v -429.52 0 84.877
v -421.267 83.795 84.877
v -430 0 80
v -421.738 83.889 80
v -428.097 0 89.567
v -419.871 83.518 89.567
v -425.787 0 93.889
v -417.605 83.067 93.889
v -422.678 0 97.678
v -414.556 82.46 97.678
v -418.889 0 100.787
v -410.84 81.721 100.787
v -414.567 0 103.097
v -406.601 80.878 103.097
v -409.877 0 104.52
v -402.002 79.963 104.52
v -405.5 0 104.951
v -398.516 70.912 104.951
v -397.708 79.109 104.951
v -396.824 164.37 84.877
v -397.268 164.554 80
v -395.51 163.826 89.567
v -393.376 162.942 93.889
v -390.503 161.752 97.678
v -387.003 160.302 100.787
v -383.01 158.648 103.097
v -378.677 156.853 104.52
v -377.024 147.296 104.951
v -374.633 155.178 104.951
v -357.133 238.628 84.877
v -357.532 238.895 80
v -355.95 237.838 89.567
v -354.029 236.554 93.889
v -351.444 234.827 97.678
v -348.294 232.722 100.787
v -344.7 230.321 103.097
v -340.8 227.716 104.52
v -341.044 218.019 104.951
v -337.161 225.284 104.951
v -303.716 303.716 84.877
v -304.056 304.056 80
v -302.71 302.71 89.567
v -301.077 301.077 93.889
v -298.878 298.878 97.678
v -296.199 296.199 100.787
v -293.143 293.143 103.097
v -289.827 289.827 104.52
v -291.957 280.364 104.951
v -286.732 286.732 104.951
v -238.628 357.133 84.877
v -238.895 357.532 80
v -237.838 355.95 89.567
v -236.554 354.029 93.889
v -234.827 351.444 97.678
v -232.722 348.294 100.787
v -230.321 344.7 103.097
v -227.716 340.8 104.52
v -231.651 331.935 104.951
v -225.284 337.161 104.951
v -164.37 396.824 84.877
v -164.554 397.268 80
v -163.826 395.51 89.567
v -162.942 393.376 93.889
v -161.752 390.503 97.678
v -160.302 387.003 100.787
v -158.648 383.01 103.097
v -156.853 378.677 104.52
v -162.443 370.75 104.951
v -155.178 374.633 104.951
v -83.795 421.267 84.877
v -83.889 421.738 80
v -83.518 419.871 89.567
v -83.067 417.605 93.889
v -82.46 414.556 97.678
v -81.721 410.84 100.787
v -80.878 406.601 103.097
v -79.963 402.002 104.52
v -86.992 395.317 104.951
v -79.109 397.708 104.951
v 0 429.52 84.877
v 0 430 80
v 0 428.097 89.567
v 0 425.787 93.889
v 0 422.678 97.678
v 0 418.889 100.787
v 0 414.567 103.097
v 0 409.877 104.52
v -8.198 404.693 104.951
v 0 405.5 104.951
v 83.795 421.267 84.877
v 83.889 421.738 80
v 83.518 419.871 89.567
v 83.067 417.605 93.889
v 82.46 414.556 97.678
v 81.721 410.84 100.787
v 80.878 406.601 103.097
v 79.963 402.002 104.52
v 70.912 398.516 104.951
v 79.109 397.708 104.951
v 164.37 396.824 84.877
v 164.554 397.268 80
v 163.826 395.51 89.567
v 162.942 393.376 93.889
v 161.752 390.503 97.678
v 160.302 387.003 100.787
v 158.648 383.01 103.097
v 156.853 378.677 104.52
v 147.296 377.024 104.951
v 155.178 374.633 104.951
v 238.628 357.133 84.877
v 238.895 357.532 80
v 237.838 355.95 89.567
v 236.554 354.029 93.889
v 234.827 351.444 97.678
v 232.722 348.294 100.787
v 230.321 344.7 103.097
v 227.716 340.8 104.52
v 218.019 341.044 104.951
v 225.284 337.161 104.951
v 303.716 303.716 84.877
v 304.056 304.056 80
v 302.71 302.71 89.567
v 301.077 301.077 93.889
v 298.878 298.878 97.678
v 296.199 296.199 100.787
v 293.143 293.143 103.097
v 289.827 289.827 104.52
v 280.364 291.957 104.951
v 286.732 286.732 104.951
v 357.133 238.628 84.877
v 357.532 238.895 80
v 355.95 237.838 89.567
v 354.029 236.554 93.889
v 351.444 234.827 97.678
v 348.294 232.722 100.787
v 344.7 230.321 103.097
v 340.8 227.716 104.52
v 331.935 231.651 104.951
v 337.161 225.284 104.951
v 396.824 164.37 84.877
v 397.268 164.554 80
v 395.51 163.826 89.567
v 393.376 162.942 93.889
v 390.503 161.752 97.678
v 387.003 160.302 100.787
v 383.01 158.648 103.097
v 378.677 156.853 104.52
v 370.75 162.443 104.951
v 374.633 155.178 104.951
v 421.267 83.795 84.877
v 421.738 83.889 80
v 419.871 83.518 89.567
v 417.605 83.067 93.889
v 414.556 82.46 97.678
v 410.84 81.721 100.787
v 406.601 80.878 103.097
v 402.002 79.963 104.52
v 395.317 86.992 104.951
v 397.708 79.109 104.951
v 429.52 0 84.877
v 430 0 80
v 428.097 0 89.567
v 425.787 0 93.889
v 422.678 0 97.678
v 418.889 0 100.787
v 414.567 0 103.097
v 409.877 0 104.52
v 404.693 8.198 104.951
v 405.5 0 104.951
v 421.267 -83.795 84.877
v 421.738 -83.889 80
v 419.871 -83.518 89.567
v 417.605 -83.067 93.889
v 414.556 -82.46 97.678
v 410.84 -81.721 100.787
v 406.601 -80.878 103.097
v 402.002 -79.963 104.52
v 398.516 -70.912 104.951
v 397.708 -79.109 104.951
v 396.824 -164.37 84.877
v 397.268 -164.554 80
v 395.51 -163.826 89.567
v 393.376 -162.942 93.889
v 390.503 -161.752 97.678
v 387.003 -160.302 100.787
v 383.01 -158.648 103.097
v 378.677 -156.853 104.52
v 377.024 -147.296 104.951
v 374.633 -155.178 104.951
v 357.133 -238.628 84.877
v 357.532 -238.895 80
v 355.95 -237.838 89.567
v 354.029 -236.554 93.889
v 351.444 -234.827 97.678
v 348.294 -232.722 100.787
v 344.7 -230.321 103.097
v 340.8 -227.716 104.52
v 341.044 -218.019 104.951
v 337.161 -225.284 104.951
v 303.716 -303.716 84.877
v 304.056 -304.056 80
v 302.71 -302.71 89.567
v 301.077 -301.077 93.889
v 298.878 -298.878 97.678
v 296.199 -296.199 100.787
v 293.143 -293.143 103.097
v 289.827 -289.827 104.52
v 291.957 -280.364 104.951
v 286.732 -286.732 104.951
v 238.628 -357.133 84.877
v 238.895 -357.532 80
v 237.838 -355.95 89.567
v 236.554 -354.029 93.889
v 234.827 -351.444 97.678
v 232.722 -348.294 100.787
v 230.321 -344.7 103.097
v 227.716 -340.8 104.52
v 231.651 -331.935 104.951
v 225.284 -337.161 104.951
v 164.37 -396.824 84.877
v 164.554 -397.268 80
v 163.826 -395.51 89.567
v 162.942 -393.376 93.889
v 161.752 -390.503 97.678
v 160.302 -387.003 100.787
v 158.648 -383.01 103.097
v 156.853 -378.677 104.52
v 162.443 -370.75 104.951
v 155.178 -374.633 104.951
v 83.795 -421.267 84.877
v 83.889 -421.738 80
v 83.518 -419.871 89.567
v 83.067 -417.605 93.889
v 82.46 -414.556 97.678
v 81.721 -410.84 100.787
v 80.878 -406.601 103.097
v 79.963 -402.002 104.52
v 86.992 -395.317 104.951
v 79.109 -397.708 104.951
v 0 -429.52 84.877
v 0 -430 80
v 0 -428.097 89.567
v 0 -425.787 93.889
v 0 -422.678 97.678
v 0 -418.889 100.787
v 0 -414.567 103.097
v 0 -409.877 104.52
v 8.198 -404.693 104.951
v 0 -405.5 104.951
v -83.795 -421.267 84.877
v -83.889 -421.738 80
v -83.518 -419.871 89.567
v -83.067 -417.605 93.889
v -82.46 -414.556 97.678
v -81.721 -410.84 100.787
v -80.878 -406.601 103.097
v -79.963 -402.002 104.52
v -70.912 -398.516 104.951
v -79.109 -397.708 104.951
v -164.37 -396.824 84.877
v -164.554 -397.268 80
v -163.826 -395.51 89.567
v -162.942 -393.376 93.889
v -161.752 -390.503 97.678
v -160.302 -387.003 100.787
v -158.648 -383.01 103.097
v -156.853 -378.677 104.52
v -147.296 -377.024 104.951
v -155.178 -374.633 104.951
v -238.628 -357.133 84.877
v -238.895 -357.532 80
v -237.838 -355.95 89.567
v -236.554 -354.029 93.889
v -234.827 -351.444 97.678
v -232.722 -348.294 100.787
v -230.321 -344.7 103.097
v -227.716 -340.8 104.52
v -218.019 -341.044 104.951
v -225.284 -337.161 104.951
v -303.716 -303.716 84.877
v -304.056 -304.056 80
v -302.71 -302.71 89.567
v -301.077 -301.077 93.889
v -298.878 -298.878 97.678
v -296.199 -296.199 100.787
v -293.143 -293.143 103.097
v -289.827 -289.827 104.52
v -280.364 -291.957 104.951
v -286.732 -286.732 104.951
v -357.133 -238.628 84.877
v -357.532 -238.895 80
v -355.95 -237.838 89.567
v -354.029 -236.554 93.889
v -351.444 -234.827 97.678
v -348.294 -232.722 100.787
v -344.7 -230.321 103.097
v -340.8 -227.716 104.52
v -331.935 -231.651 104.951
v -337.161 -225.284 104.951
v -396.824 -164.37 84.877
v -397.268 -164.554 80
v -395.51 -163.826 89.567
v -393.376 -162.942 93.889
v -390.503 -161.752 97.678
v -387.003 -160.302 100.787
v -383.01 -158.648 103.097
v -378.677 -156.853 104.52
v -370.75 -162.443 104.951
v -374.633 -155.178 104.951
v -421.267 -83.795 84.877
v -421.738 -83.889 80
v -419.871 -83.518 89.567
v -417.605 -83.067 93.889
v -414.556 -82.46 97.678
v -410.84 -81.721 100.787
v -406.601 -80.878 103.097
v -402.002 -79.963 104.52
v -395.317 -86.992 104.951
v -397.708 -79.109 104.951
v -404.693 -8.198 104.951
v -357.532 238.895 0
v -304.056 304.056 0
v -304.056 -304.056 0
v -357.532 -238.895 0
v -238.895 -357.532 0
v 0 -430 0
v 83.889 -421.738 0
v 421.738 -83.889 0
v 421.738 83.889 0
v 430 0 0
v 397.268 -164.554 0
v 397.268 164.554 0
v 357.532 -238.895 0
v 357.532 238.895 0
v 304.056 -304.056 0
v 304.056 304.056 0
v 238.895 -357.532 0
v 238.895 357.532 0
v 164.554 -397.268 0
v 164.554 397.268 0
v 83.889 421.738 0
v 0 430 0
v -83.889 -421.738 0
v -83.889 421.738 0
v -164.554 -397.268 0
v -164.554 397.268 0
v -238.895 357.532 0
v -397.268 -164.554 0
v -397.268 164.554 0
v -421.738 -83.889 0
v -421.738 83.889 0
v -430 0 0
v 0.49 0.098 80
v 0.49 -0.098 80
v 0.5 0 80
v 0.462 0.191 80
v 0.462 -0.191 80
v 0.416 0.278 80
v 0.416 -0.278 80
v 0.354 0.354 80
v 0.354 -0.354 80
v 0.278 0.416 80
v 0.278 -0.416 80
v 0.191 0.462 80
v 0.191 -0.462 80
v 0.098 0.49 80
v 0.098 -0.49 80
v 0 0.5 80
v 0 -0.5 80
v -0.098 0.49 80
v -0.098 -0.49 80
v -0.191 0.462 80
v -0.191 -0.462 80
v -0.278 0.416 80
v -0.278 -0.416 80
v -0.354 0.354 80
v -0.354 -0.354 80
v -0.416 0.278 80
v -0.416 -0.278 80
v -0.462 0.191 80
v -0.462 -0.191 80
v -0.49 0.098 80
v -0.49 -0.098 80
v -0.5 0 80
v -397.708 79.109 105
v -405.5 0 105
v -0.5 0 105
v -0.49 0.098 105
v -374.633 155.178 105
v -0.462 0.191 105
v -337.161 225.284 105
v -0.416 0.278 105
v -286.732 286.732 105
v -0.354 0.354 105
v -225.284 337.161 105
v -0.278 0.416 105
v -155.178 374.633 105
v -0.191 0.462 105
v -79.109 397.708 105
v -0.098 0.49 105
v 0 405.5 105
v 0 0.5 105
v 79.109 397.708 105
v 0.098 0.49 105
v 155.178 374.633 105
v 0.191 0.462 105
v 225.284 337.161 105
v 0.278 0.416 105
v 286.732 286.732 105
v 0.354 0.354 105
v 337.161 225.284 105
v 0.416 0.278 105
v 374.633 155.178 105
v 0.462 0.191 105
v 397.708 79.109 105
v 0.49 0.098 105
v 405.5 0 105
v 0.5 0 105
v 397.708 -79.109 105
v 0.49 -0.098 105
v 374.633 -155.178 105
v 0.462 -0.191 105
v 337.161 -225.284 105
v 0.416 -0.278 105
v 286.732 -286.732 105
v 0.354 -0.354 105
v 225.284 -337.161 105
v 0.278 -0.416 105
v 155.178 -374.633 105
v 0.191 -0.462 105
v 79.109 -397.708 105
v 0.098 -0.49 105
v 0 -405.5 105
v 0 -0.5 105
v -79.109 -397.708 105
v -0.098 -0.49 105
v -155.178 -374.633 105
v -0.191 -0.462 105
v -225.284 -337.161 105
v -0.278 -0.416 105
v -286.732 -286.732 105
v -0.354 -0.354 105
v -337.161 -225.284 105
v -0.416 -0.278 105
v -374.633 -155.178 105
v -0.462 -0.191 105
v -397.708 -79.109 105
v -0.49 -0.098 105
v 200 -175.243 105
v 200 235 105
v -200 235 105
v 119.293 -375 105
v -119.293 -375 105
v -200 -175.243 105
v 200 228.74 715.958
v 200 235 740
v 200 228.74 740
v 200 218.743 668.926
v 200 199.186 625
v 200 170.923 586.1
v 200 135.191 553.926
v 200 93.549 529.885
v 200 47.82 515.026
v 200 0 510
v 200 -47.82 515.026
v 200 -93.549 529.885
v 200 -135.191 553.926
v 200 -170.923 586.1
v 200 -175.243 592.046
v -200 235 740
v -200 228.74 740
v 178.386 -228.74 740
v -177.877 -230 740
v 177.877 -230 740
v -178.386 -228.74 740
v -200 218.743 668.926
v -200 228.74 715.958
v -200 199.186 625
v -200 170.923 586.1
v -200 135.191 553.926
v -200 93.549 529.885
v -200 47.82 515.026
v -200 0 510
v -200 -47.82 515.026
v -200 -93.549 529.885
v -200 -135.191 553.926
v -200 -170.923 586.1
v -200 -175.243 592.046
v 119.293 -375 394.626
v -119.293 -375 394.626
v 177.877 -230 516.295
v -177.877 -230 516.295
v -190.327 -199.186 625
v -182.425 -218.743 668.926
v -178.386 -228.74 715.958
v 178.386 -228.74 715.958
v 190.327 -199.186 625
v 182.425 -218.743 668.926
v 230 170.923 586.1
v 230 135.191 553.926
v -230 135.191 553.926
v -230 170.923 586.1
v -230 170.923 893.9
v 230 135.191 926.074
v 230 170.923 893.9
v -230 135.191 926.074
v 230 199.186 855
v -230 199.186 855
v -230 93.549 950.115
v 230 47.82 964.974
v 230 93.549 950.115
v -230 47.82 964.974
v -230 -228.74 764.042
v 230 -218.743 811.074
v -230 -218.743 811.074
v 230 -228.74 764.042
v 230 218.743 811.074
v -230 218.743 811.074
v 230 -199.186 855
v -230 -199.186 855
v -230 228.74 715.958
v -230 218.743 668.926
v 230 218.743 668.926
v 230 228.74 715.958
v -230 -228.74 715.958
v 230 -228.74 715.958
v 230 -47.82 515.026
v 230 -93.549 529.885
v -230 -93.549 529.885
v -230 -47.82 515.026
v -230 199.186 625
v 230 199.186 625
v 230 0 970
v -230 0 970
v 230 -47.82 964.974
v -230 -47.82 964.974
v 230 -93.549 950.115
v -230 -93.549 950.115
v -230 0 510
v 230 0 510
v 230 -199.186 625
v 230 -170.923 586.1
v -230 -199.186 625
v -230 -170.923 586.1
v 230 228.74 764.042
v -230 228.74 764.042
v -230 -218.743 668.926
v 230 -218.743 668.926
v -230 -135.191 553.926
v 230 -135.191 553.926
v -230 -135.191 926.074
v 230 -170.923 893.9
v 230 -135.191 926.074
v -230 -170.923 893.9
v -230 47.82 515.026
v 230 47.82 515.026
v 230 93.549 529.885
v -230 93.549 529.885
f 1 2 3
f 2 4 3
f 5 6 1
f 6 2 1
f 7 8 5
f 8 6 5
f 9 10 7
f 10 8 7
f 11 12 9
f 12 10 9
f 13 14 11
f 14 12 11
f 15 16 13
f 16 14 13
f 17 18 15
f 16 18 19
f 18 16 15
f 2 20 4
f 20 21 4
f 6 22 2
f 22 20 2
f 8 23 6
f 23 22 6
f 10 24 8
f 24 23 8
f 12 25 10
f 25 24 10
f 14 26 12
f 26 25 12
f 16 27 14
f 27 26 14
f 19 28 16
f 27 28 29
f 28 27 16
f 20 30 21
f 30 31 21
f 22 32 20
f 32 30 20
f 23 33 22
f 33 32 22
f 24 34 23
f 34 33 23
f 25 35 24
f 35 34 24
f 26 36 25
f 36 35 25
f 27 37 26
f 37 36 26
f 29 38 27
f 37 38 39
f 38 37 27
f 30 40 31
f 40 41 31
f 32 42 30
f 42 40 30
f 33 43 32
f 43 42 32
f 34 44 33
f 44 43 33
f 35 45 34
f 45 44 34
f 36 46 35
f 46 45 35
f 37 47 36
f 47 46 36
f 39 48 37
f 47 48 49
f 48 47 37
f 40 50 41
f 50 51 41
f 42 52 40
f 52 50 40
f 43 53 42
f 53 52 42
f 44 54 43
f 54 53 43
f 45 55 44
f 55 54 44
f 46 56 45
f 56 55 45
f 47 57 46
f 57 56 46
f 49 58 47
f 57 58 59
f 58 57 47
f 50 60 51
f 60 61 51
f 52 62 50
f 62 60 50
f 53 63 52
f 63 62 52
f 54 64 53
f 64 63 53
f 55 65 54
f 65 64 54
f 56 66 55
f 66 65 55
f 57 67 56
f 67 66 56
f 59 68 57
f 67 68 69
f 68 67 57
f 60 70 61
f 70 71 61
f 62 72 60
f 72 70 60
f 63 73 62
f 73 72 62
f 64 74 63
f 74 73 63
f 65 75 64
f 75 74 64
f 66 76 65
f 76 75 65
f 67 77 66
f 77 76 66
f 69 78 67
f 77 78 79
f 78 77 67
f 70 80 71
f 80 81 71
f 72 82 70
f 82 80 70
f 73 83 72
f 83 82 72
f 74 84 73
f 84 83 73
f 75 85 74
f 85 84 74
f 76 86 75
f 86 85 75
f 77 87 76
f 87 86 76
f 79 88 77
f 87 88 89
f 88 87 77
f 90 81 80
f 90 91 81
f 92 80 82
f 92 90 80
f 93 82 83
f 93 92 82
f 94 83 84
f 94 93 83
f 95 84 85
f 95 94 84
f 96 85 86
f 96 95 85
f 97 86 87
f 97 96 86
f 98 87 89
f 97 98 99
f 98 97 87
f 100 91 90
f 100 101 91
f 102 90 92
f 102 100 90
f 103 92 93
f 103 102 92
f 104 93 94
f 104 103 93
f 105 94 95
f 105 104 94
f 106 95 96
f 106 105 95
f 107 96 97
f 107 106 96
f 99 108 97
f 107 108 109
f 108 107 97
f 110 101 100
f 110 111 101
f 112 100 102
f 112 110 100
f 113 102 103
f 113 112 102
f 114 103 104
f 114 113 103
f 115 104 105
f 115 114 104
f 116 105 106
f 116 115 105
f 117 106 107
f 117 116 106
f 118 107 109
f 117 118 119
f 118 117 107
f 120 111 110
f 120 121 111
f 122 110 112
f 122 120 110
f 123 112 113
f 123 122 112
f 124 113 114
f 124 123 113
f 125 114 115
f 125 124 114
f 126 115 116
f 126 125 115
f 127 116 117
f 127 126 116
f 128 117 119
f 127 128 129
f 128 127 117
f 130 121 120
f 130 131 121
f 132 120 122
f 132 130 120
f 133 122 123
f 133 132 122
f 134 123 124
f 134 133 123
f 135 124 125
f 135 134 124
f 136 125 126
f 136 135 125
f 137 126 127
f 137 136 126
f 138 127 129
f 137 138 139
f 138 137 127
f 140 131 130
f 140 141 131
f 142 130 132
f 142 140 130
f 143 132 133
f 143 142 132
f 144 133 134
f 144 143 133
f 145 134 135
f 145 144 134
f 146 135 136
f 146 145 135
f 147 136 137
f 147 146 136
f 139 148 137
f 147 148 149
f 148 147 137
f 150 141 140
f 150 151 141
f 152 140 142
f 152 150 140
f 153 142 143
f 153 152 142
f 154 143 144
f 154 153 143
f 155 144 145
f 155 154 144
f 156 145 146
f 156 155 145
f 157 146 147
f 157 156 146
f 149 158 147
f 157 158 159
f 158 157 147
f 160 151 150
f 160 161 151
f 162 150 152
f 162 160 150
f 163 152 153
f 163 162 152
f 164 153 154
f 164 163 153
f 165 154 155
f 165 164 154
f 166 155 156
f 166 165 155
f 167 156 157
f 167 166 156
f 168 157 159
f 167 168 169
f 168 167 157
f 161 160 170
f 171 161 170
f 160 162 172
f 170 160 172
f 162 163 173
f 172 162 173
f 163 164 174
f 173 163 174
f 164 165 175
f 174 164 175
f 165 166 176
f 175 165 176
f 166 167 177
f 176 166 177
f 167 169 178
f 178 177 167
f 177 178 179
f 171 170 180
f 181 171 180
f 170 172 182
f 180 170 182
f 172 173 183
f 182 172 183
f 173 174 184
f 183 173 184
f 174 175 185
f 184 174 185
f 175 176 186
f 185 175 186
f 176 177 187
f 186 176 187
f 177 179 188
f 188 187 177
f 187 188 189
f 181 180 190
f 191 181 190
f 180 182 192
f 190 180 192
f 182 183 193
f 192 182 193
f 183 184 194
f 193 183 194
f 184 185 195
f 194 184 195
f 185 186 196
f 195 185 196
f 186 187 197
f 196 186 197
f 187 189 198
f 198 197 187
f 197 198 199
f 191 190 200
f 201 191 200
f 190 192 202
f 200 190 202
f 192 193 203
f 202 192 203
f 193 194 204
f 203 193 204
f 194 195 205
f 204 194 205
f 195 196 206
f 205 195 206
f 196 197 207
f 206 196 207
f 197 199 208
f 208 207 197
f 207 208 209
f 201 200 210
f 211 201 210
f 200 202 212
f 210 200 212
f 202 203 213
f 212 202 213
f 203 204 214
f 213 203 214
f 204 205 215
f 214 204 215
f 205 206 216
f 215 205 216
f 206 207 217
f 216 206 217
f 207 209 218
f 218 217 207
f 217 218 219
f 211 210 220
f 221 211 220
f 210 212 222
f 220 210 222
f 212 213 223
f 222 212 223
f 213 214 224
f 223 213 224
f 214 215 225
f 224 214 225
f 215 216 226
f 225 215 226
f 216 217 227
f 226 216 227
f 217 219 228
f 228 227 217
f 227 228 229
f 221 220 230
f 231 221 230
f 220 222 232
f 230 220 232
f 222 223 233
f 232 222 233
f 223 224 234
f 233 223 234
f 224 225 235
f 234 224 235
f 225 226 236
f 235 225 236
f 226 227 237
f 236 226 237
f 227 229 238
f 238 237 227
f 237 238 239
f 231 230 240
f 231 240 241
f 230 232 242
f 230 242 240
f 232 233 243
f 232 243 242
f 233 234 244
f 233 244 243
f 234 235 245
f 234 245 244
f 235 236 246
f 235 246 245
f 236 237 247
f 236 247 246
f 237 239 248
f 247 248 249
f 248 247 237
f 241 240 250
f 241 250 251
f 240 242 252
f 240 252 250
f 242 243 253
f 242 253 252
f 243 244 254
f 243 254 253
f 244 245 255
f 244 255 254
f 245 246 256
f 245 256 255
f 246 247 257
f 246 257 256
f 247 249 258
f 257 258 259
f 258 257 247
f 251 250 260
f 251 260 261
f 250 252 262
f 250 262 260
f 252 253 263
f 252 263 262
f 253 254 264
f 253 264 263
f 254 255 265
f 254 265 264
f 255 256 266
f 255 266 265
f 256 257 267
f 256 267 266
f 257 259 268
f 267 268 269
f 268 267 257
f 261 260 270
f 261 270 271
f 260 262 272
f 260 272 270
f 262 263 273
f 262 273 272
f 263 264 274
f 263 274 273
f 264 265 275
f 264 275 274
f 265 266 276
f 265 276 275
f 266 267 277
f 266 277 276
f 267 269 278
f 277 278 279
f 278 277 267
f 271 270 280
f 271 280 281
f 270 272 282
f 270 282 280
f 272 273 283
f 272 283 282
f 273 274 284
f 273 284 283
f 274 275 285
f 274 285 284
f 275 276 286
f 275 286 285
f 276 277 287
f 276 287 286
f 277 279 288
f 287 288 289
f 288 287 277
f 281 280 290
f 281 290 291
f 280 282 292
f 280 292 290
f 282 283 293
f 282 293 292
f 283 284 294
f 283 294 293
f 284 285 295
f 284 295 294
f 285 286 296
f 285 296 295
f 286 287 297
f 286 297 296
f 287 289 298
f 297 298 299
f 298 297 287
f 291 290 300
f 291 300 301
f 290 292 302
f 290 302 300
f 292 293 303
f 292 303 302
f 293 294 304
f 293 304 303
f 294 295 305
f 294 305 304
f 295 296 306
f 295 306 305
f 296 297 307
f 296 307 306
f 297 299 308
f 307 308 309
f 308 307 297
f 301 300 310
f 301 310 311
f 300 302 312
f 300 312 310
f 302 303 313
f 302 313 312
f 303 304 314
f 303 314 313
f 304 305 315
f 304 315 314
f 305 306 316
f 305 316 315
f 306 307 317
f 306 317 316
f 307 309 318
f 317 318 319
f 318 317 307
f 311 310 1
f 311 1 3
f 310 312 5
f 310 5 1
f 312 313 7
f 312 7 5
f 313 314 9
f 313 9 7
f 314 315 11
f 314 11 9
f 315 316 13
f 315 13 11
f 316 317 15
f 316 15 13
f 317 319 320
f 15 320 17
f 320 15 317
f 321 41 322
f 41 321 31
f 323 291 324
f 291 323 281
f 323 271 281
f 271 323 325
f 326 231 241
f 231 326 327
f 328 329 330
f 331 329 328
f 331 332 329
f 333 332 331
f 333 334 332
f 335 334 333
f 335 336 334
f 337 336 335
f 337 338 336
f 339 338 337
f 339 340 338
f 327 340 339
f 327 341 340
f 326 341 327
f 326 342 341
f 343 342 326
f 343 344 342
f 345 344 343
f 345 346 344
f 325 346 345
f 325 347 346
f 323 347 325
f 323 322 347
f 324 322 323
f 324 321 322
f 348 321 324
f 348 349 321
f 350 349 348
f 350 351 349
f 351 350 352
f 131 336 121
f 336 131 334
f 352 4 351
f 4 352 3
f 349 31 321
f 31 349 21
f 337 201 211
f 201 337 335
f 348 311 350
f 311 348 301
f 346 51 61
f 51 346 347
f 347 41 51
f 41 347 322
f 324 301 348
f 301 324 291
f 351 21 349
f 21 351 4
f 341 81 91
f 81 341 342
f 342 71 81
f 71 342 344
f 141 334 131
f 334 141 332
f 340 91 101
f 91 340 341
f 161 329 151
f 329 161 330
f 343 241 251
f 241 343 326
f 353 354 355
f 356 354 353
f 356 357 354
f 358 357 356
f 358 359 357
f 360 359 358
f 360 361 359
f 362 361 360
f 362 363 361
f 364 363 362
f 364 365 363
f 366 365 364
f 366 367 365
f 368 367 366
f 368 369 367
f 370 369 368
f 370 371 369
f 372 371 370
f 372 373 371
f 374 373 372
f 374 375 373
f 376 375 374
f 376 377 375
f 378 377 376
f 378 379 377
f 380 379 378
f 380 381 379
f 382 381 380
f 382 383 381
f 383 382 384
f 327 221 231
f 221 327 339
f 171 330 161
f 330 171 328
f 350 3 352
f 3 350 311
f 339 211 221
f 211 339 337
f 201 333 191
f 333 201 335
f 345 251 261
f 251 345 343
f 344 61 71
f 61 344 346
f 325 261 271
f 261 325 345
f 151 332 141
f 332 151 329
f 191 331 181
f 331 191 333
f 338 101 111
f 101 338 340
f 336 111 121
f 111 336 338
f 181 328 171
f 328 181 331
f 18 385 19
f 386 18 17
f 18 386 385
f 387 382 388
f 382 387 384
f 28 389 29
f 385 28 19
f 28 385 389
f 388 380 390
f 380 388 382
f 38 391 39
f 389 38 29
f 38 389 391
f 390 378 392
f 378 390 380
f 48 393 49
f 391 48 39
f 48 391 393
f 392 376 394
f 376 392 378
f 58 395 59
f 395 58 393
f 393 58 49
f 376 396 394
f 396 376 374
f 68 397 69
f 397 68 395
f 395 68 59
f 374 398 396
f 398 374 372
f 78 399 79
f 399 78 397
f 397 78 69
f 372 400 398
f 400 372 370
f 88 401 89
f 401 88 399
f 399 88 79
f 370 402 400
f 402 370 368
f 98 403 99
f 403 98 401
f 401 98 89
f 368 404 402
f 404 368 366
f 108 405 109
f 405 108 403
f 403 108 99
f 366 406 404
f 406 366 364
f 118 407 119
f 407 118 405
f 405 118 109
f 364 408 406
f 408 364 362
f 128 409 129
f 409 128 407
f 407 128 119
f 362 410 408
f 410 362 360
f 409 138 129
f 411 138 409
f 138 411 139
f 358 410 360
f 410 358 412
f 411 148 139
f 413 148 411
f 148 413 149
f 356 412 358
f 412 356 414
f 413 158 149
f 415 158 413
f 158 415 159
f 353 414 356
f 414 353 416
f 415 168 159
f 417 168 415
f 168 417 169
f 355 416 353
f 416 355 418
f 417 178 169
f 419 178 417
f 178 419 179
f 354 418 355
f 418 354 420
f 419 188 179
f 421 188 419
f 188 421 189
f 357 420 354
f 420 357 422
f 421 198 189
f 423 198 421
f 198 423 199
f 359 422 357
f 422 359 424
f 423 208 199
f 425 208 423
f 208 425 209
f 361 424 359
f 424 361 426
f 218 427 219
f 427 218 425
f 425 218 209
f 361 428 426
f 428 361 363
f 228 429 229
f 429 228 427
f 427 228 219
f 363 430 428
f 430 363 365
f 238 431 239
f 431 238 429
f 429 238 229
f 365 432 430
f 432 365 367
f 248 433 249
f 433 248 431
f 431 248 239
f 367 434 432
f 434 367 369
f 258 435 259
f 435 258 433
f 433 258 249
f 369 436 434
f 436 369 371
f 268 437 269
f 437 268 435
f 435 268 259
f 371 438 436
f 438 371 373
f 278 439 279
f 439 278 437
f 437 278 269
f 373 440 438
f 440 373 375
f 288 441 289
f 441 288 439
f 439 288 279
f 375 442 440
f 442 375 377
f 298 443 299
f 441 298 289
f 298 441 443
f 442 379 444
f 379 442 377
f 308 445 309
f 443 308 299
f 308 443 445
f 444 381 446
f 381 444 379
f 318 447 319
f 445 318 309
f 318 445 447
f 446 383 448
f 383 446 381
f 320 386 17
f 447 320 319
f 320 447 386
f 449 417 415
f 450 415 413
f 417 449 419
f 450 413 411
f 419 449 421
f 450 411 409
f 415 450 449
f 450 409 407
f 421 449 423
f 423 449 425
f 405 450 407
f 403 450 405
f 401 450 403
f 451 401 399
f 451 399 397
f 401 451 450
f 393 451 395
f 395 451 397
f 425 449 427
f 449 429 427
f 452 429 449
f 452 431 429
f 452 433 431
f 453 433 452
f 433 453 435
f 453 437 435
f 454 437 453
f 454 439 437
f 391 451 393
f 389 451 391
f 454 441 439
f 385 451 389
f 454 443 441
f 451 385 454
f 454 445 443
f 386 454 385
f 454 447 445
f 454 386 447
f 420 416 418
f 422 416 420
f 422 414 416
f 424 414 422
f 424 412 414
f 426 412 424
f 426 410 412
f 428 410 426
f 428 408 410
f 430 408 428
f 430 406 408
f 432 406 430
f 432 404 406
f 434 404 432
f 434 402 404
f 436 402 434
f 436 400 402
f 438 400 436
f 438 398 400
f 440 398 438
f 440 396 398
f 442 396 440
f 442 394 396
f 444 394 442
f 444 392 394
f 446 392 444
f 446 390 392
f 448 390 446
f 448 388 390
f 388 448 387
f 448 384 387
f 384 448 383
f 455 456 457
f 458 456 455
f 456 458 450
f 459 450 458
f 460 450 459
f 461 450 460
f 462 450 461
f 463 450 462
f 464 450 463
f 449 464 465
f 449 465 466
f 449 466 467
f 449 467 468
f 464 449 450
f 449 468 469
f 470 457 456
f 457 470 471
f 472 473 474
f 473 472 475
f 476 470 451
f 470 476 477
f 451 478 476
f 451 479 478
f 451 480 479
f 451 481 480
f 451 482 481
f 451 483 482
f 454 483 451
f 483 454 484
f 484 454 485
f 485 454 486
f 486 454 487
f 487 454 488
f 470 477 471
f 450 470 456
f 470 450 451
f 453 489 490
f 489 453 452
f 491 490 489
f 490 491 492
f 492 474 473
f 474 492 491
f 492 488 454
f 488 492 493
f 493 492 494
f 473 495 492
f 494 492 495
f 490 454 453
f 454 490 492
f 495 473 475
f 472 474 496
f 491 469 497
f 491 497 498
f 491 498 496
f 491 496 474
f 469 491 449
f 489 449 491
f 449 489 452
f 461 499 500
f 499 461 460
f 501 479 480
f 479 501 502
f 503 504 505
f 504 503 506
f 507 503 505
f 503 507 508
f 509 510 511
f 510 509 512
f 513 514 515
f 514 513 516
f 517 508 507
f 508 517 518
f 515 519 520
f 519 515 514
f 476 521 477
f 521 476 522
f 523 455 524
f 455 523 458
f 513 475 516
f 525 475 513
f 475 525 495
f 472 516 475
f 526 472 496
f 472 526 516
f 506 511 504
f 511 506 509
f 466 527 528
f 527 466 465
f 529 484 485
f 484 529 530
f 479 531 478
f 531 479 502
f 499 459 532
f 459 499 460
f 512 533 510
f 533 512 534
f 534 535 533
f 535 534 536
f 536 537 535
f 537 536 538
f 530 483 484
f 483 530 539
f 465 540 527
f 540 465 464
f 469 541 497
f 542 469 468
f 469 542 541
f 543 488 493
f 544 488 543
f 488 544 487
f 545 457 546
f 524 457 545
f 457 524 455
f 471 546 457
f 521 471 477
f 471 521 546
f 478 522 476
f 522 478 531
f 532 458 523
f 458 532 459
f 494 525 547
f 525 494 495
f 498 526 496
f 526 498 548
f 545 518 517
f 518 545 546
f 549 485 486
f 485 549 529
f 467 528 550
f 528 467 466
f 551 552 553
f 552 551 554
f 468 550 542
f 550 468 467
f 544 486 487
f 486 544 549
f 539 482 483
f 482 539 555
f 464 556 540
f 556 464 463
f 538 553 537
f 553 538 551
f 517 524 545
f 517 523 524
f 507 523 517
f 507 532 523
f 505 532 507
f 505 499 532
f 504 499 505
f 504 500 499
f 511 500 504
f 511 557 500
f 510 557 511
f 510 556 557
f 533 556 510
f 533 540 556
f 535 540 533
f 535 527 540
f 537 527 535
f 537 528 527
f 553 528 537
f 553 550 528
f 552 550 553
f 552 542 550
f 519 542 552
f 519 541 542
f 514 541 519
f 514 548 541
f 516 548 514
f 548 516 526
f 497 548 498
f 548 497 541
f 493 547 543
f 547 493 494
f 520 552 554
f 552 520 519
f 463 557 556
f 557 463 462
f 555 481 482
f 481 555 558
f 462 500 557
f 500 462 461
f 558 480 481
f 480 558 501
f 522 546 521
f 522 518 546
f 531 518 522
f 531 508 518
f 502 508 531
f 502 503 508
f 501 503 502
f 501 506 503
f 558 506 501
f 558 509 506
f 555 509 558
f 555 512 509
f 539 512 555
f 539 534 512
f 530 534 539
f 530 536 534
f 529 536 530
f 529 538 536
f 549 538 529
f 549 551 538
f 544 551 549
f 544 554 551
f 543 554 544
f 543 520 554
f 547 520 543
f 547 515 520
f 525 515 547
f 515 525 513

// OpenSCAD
// Hombro del robot
union()
{
	rotate_extrude($fn=32)
	translate([405,80,0])circle(r=25);
	rotate_extrude($fn=32)
	translate([215,40,0])square([430,80],center=true);
	rotate_extrude($fn=32)
	translate([203,80,0])square([405,50],center=true);
}

translate([230,0,740])  rotate([0,-90,0])   cylinder(h=460 ,r1=230, r2=230, center=false);

difference()
{
	union()
	{
		translate([0,0,422.5]) cube(size = [400,460,635], center = true);
		difference()
		{
			translate([0,-70,422.5]) cube(size = [400,610,635], center = true);
			translate([00,-400,700]) rotate([40,0,-0])  cube(size = [500,500,500], center = true);
		}
	}
	union()
	{
		translate([-335,-375,410]) rotate([0,0,112])  cube(size = [400,400,700], center = true);
		translate([335,-375,410]) rotate([0,0,-112])  cube(size = [400,400,700], center = true);
	}
}
